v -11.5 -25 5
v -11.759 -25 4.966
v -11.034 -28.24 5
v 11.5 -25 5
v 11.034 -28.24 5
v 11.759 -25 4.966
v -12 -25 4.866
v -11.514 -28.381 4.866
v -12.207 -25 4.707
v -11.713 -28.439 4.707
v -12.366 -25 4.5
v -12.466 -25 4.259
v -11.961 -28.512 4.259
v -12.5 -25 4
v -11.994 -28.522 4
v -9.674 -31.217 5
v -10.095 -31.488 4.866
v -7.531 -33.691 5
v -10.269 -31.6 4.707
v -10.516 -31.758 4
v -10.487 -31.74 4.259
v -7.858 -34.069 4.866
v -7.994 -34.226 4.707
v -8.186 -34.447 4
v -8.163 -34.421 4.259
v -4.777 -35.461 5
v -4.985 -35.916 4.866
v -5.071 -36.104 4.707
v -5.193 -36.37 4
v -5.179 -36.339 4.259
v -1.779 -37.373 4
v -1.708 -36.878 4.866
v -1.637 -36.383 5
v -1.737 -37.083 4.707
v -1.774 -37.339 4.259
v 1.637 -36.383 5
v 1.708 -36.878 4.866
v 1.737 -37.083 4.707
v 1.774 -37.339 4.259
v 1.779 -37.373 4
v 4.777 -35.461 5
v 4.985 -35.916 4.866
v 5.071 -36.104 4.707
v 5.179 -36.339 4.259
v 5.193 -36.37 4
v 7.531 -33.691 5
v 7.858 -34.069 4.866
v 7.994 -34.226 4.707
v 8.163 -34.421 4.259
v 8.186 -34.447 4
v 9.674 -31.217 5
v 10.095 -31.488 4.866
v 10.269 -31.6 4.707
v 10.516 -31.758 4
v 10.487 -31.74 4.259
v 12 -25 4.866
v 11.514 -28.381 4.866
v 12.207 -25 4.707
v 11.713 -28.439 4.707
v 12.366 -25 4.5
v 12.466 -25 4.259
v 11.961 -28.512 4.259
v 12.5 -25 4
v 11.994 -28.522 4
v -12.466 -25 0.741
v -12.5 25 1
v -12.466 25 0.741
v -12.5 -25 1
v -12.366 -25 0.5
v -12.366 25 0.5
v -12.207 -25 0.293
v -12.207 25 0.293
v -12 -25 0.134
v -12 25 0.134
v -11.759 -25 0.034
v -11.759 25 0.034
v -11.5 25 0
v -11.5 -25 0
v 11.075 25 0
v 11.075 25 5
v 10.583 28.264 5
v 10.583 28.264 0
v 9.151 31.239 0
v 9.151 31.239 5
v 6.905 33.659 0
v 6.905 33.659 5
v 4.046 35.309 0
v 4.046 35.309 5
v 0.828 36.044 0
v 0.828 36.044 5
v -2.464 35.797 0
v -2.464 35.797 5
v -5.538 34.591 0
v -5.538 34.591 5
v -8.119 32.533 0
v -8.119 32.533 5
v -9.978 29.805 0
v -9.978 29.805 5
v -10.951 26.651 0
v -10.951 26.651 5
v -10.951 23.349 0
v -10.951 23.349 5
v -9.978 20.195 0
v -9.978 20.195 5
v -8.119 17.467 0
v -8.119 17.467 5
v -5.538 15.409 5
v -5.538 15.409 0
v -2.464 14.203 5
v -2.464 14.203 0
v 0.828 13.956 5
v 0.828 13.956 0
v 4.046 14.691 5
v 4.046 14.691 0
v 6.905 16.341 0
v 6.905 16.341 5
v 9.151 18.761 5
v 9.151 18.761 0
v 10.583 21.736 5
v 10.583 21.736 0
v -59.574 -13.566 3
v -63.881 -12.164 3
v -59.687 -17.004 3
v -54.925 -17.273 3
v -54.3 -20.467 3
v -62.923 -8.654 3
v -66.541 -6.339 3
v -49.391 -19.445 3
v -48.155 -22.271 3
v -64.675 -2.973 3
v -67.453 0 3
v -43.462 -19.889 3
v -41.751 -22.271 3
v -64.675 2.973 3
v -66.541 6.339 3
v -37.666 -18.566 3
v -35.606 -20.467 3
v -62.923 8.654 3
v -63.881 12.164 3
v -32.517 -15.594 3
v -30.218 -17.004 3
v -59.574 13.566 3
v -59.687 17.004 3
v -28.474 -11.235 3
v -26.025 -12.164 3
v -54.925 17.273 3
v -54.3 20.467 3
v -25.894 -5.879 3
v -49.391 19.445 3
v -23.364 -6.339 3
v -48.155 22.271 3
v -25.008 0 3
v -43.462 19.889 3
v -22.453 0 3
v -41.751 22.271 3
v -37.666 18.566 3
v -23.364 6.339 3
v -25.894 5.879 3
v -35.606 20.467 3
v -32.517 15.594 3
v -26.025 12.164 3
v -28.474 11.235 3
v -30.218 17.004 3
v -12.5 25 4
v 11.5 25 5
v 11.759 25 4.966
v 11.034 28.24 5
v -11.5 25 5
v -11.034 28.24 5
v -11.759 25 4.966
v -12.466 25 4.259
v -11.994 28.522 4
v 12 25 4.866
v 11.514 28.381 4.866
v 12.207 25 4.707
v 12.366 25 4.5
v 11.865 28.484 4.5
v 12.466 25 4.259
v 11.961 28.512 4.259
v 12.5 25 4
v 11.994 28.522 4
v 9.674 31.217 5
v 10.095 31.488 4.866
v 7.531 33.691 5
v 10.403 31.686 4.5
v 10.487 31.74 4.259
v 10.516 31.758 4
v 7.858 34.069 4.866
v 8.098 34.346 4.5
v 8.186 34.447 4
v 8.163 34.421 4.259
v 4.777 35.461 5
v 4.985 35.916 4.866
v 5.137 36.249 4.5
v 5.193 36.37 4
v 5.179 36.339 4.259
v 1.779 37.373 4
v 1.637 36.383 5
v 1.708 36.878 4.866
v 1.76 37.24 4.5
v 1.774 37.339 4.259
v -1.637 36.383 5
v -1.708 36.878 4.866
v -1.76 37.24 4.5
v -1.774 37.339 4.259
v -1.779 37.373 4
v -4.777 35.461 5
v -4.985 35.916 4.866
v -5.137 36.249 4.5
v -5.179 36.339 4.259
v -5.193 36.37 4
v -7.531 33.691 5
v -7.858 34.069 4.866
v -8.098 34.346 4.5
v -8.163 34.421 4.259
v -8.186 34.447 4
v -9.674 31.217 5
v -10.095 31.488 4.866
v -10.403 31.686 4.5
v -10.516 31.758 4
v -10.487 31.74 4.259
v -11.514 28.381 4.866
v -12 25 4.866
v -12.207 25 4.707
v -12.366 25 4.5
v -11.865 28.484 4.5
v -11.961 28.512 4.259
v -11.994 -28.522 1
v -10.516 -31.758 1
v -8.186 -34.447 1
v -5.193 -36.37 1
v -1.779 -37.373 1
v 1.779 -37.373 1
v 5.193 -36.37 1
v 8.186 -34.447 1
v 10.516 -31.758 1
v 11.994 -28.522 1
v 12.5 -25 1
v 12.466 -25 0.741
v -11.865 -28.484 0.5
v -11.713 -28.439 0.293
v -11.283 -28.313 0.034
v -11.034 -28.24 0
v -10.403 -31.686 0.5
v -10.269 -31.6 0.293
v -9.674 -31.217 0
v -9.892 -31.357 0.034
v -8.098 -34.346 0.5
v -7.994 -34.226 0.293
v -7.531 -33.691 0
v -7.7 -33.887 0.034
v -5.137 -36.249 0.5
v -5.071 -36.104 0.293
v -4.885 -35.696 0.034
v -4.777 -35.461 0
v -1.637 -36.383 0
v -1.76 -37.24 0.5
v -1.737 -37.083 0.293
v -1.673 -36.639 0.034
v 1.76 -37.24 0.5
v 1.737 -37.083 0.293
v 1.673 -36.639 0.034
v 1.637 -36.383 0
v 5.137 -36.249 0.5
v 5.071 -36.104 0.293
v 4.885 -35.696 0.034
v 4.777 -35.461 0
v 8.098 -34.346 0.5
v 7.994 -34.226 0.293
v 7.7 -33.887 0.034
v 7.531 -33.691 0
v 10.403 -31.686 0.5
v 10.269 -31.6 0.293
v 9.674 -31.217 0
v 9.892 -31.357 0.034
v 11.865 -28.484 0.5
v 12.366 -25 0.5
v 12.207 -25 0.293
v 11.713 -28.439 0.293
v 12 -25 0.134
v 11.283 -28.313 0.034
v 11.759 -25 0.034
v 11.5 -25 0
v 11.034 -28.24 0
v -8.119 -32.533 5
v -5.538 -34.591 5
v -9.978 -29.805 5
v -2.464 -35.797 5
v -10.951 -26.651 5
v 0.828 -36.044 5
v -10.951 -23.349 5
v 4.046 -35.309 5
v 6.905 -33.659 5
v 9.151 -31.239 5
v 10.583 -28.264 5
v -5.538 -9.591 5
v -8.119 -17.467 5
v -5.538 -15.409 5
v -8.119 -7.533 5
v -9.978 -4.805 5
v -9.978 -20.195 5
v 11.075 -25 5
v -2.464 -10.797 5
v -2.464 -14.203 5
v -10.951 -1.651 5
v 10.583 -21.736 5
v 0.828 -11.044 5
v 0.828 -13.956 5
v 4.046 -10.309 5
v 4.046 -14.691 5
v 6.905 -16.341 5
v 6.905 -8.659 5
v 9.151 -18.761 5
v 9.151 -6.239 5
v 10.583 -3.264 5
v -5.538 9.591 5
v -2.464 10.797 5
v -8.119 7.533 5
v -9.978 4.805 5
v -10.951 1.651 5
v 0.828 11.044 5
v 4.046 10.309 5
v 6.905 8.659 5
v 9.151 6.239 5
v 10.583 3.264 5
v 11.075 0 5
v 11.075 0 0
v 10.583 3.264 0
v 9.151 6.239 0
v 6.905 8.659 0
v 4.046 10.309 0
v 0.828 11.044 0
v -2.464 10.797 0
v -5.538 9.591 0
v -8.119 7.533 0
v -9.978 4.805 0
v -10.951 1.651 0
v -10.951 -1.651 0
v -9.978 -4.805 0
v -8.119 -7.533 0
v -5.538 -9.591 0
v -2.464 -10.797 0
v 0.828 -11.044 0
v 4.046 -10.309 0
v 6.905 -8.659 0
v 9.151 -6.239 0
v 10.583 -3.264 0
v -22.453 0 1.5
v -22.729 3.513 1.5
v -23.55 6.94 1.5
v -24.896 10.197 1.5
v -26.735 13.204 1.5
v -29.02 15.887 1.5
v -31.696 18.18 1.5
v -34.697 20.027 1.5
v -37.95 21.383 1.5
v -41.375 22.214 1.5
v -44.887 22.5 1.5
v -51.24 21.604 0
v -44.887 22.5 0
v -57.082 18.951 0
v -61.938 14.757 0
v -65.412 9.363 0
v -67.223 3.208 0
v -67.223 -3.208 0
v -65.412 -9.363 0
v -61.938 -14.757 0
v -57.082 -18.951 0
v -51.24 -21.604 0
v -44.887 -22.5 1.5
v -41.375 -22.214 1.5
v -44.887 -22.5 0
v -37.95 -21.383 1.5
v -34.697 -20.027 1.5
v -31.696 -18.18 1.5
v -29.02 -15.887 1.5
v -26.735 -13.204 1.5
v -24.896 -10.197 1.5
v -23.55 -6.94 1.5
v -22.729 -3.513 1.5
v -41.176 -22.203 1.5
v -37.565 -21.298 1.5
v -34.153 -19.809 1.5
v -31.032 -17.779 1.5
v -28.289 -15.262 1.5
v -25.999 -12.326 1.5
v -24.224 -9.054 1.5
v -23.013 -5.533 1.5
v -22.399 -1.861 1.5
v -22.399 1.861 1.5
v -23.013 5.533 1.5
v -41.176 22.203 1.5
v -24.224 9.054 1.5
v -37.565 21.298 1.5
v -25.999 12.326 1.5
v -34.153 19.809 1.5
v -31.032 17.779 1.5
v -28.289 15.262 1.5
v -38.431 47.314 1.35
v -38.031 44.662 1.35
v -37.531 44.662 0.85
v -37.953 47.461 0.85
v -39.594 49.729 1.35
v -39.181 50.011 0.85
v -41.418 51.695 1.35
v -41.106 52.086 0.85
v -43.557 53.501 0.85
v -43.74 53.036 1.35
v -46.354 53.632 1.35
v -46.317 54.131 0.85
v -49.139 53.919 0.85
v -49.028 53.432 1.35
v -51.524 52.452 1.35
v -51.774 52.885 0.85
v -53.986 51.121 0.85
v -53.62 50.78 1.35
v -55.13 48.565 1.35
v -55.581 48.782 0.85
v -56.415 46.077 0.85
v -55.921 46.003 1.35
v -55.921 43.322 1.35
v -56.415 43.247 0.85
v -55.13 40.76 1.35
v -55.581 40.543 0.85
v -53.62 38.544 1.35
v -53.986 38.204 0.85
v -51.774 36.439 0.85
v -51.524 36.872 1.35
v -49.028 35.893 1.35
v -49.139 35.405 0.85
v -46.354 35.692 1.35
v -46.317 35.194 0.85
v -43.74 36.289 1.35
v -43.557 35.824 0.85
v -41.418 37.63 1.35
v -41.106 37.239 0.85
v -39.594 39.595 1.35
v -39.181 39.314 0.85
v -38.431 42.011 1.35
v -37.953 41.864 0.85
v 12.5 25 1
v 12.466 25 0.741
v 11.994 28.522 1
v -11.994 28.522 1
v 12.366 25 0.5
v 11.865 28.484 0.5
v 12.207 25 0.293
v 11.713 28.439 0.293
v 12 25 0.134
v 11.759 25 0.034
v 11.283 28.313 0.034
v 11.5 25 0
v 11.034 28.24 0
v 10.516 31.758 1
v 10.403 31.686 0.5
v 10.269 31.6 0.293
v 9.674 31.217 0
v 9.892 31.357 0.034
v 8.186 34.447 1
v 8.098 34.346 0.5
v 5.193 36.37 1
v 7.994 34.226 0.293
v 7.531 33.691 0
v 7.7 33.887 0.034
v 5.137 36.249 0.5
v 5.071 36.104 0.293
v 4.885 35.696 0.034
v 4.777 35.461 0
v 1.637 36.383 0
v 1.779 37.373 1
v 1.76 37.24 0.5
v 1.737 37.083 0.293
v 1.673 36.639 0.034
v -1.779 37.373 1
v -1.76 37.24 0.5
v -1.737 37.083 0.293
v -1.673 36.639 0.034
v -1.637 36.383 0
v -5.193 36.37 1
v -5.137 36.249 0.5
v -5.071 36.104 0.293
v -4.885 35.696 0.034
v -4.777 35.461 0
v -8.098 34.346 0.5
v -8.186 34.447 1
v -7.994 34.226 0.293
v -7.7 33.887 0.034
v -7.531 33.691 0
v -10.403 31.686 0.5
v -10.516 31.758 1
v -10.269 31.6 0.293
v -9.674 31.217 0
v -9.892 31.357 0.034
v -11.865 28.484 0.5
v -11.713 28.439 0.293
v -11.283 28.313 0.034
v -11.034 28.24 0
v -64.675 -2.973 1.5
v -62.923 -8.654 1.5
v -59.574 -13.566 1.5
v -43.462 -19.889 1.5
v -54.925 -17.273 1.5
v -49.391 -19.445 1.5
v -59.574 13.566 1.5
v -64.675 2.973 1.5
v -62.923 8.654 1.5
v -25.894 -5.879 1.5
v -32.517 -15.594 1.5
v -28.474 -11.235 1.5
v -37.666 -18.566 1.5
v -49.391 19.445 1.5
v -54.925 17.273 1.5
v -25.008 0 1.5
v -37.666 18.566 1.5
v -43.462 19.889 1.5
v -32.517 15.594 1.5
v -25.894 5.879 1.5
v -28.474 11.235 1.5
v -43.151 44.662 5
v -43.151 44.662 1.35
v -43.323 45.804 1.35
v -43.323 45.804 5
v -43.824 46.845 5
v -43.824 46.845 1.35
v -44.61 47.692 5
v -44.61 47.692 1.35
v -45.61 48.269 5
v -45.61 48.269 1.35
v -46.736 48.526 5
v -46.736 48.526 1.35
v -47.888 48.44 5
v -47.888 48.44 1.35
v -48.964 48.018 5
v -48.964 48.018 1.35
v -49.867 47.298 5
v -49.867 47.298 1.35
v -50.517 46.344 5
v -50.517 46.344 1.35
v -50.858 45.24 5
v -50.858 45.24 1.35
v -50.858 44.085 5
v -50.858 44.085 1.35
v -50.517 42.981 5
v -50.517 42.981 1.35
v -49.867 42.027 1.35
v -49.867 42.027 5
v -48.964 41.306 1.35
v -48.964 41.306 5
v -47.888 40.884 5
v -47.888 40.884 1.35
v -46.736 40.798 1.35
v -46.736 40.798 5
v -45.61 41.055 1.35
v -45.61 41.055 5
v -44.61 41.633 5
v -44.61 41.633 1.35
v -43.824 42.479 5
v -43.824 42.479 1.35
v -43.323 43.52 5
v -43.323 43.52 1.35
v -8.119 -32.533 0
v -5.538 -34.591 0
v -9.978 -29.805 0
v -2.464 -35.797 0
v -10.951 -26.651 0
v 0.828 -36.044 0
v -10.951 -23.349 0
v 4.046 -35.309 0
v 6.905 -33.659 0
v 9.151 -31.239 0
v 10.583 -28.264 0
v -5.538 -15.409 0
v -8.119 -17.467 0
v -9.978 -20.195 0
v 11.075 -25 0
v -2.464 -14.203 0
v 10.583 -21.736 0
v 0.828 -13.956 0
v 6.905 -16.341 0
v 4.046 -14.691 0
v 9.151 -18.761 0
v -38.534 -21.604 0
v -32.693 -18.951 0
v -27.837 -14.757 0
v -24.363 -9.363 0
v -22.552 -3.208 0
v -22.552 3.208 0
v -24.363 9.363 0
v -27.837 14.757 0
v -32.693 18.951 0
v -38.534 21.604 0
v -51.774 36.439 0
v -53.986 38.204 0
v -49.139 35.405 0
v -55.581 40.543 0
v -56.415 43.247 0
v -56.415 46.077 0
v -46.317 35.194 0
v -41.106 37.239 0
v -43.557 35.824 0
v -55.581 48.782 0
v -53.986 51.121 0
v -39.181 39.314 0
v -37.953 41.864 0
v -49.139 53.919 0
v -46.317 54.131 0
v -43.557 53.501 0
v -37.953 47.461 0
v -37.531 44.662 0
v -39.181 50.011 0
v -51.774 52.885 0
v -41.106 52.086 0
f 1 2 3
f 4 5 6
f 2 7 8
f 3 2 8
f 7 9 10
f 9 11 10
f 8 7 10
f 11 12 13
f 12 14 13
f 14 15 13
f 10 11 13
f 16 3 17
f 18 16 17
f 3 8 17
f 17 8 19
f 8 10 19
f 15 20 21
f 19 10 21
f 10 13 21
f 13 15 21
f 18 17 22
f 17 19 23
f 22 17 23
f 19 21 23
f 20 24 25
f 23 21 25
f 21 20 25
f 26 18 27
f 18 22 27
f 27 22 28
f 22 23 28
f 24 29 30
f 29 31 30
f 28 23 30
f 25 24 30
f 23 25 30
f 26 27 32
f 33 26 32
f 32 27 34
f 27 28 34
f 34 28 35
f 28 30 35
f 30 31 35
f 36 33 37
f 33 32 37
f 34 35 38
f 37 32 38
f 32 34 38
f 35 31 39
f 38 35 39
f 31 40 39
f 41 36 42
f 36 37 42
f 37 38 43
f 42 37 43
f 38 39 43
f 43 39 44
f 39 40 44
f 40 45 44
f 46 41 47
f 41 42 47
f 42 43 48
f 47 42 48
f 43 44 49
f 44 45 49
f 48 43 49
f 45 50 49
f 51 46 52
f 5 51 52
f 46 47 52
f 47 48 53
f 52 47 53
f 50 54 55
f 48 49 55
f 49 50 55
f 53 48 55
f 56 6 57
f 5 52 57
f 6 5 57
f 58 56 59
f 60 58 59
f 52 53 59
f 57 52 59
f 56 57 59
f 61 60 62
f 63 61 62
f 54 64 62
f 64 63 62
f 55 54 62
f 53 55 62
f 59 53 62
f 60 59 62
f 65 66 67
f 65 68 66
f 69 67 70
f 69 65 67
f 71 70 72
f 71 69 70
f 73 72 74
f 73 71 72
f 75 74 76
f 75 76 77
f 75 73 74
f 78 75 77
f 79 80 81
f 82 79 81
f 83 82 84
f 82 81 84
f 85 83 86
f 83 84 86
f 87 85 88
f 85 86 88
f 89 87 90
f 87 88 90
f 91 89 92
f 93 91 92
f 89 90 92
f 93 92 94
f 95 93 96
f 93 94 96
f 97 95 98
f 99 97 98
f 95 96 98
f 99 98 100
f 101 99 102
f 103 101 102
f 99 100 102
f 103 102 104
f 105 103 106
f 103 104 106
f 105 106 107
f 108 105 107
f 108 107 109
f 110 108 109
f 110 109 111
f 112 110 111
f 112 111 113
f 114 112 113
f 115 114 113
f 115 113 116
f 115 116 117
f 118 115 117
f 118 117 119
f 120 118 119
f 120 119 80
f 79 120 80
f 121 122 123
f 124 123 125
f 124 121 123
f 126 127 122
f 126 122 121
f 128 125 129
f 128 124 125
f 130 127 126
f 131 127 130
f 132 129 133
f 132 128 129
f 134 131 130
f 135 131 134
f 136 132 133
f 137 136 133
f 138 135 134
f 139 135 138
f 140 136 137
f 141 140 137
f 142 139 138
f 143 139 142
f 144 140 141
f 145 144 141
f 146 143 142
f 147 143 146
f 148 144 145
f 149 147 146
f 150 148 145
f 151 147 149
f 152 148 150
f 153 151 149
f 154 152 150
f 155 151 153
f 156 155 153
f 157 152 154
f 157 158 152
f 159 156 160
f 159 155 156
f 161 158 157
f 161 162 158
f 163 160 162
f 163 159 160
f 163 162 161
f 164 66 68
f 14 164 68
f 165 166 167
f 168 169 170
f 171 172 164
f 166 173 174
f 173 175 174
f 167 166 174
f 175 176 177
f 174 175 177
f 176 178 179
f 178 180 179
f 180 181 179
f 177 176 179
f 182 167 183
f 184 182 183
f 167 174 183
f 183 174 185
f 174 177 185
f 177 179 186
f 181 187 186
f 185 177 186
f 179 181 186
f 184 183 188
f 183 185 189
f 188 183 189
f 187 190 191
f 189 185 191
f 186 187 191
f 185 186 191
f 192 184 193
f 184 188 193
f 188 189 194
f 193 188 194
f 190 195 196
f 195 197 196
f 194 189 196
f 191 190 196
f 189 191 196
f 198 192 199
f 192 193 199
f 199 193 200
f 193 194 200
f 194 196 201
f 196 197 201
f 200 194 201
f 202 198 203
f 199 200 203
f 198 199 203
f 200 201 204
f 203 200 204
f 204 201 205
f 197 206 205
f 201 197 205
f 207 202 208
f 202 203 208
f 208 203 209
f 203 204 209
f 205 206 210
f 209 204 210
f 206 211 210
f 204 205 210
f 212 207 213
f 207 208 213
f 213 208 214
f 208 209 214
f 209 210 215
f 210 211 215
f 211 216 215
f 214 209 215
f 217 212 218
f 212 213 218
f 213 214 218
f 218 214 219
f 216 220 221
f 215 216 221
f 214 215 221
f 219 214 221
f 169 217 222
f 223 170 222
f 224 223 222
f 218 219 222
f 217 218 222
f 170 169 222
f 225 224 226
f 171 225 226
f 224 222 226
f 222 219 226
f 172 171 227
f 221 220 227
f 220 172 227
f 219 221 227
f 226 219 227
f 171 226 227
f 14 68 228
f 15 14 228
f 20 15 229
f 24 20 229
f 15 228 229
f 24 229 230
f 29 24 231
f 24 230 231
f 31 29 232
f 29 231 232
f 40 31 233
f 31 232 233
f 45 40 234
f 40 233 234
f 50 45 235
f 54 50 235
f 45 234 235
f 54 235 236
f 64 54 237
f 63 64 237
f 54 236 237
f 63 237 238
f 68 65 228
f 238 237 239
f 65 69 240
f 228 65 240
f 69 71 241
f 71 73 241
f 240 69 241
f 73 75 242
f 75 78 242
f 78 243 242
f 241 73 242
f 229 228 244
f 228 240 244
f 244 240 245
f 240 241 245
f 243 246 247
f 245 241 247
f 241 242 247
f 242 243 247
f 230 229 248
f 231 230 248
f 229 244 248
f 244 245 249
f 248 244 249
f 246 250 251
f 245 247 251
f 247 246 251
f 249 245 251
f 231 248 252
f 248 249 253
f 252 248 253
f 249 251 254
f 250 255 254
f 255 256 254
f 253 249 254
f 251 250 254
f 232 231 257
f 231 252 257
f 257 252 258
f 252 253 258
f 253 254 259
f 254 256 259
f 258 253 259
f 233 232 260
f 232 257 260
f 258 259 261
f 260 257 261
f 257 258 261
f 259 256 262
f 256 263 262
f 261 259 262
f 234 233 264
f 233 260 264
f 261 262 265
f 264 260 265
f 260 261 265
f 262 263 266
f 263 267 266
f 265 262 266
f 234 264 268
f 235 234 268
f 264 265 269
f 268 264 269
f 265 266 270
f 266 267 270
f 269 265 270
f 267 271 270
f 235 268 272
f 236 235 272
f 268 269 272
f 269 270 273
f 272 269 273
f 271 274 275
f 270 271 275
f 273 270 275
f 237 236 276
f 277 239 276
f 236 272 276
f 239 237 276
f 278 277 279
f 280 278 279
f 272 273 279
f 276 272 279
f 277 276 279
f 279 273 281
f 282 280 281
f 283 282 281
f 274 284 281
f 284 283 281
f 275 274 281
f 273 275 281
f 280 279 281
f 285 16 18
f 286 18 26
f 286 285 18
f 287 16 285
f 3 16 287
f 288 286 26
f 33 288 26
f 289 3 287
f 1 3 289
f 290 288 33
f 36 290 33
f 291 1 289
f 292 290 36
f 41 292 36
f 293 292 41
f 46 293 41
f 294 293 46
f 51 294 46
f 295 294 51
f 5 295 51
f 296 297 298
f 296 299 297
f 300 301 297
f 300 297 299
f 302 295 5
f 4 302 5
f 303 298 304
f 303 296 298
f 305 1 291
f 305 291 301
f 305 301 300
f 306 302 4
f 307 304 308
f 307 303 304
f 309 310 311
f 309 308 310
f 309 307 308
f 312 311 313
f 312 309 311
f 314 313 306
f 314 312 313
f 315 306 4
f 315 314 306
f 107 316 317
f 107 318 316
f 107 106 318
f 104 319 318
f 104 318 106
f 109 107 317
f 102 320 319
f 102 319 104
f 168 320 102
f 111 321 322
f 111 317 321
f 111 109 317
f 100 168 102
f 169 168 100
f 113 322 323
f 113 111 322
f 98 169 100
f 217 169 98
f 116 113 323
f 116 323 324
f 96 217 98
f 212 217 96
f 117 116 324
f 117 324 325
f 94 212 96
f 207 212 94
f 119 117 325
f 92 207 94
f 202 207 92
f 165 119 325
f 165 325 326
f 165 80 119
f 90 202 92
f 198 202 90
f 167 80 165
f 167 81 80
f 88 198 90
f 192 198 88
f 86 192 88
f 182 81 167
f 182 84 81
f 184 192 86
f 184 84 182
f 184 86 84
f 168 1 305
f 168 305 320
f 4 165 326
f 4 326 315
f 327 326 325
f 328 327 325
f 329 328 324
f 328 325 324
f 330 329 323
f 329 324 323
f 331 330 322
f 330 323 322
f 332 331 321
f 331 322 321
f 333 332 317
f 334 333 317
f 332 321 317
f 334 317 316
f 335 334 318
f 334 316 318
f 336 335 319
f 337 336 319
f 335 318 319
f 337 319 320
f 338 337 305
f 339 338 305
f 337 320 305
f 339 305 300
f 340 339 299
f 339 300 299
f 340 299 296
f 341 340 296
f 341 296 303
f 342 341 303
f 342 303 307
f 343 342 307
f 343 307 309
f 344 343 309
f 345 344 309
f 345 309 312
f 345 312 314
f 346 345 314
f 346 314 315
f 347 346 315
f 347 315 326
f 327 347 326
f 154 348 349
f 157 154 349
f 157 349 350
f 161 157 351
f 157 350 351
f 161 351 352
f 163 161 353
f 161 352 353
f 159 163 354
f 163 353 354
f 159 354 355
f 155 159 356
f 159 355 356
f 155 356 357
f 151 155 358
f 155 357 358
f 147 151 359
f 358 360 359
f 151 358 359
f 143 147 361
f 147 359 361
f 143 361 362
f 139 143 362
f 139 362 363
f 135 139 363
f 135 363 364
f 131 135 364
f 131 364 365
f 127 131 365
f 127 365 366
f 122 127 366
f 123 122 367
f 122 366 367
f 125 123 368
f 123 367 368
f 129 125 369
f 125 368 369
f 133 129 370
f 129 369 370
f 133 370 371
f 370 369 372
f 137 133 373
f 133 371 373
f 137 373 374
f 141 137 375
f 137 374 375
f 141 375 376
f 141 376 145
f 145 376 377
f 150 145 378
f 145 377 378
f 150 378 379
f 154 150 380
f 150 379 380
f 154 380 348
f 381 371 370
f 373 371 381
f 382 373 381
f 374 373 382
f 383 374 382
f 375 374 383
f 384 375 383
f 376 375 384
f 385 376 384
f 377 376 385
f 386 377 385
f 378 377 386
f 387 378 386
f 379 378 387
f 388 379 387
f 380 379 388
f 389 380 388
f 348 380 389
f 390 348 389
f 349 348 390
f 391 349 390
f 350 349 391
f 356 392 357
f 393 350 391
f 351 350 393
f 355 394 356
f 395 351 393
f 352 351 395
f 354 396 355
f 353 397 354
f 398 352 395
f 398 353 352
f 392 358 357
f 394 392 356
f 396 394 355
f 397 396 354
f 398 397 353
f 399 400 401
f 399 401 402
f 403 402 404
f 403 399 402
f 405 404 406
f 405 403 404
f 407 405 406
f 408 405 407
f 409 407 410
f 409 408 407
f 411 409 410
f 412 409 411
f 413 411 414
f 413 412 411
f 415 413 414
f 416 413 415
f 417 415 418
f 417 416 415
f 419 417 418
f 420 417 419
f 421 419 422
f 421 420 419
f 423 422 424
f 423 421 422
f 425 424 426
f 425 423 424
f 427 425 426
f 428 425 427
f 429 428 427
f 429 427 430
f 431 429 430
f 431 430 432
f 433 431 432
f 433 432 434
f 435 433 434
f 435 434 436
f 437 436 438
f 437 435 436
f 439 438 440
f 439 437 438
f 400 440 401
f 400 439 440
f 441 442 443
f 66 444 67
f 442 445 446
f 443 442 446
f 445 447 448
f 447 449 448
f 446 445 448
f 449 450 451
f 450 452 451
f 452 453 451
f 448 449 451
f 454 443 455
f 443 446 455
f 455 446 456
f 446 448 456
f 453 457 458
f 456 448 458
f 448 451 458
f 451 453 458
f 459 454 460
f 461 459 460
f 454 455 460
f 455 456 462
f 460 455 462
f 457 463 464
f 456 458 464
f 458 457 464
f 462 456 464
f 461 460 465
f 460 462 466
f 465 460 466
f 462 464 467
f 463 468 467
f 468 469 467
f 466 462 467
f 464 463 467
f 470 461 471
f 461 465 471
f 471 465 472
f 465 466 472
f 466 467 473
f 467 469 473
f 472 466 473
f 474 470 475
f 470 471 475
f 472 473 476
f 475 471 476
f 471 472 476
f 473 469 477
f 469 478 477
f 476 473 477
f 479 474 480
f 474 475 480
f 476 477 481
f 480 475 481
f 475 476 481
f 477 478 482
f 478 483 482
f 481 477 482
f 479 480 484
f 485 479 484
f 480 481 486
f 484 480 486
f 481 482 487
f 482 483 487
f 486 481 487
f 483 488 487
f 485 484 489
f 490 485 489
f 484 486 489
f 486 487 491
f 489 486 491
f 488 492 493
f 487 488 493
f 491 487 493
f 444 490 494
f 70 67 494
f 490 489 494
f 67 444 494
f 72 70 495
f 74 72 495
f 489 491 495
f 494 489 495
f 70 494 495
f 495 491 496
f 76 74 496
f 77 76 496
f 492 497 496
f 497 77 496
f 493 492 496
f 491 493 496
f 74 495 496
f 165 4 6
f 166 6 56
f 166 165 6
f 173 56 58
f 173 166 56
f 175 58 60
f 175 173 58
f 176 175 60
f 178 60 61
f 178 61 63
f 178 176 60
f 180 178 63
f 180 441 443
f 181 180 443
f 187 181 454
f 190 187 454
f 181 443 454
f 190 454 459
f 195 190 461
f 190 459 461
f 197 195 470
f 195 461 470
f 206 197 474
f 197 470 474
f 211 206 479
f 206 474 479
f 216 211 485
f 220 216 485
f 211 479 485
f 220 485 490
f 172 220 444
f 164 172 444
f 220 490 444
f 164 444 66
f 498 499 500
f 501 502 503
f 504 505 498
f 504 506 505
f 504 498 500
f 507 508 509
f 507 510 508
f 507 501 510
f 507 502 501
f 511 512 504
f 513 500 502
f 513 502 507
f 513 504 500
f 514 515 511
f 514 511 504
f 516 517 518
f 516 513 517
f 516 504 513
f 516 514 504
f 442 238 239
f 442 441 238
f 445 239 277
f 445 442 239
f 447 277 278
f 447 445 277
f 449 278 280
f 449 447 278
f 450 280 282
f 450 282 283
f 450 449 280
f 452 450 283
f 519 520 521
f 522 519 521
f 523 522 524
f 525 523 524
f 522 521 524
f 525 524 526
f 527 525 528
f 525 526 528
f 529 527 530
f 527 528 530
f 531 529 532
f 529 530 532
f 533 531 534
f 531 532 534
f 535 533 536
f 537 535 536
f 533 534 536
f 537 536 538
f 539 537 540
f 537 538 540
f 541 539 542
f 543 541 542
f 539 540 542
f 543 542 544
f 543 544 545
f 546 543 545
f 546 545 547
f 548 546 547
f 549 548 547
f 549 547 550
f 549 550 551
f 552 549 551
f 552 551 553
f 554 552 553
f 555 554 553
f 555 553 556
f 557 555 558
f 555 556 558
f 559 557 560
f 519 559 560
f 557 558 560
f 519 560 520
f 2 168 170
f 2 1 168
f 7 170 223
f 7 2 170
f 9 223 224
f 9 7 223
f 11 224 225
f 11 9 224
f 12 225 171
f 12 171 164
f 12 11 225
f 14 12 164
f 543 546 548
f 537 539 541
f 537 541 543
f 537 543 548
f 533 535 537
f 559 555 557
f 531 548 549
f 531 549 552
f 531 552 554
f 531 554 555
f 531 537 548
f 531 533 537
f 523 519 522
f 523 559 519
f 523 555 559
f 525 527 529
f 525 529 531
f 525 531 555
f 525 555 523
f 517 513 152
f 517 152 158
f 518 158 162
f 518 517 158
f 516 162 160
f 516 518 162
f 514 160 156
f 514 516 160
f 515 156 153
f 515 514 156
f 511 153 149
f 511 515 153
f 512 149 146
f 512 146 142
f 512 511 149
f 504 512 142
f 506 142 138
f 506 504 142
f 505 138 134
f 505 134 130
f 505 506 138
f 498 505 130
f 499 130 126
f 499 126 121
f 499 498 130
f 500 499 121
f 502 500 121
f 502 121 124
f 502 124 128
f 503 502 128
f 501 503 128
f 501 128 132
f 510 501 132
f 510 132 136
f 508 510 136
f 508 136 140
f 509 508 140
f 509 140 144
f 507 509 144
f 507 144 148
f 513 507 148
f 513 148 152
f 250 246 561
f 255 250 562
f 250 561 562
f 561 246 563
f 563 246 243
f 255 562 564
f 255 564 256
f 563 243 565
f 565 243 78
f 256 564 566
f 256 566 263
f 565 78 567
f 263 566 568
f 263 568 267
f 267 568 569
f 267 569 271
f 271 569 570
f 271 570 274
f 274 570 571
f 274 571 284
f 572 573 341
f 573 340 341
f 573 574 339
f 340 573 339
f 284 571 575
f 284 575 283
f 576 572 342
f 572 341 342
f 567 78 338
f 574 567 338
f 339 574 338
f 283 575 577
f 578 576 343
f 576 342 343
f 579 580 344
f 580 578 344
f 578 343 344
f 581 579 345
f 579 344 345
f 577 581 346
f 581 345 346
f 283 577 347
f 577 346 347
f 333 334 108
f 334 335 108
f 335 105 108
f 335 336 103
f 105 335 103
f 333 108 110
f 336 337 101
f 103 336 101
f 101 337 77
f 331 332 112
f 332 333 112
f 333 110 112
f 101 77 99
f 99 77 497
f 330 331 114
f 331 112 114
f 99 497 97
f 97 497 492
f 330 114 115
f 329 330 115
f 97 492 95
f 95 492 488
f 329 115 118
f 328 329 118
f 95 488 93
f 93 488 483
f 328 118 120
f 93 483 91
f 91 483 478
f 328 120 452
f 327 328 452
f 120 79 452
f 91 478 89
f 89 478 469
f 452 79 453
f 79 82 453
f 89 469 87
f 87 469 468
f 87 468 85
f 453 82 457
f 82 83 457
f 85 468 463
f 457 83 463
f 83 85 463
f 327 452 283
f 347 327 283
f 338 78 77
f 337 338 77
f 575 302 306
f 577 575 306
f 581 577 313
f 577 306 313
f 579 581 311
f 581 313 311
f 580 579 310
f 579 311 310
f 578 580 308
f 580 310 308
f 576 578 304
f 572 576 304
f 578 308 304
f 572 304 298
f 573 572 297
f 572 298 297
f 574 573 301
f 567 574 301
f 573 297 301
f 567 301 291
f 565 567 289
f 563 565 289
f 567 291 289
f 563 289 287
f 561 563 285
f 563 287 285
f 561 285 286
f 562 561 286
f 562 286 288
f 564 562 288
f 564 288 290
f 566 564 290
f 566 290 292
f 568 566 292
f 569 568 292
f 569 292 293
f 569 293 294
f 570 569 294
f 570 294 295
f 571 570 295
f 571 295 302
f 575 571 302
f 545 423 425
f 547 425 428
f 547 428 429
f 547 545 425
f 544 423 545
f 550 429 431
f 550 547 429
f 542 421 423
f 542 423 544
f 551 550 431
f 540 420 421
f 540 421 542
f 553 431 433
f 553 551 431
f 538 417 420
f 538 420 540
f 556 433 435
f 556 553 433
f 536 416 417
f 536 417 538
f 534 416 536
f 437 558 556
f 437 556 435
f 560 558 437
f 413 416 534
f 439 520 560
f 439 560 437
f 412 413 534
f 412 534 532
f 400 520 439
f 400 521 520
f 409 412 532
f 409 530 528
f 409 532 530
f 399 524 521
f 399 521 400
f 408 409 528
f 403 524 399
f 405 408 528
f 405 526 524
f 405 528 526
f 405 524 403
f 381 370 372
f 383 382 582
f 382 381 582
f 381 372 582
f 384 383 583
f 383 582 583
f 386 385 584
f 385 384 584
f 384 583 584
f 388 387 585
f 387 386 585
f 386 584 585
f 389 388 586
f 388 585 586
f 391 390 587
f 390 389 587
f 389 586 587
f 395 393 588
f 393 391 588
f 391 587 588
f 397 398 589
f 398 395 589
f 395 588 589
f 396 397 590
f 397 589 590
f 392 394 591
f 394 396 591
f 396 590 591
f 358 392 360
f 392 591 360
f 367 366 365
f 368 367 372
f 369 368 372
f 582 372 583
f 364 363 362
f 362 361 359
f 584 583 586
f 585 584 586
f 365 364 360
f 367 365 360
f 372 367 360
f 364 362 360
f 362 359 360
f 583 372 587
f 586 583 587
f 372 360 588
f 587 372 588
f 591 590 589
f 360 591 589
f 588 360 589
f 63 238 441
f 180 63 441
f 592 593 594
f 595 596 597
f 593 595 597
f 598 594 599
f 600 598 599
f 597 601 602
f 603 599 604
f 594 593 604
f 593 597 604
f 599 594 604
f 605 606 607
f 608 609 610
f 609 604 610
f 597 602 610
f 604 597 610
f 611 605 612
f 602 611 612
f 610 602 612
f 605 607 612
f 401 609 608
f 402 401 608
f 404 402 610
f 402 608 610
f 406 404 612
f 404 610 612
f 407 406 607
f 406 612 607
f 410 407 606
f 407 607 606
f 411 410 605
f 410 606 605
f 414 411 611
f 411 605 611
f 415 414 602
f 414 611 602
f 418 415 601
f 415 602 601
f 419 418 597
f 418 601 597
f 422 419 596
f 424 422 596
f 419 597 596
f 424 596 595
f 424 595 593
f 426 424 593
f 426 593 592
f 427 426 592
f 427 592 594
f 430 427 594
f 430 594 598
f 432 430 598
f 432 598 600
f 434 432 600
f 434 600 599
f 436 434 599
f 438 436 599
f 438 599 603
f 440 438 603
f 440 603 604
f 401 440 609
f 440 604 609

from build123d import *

# Parameters (mm, degrees)
F1_DEPTH  = 5
F2_R      = 11.075
F3_DEPTH  = 25
F4_R      = 22.5
F4_R_2    = 19.945
F5_DEPTH  = 3
F6_R      = 22.5
F7_DEPTH  = 1.5
F8_R      = 9.495
F9_DEPTH  = 1.35
F10_SIZE  = 0.5
F11_R     = 3.875
F12_DEPTH = 3.65
F13_R     = 1


# Not quite as in the source:
# - a feature names something its author has since deleted; it is built from what else it names


with BuildPart() as f1:
    # F0 (on Top) → F1 (new body)
    with BuildSketch(Plane.XY):
        with BuildLine():
            ThreePointArc((0, -12.5), (8.8388347648, -8.8388347648), (12.5, 0))
            ThreePointArc((12.5, 0), (8.8388347677, 8.838834762), (8.1e-09, 12.5))
            ThreePointArc((8.1e-09, 12.5), (-8.838834762, 8.8388347677), (-12.5, 0))
            ThreePointArc((-12.5, 0), (-8.8388347648, -8.8388347648), (0, -12.5))
        make_face()
        with BuildLine():
            Line((12.5, -25), (12.5, 0))
            ThreePointArc((12.5, 0), (8.8388347648, -8.8388347648), (0, -12.5))
            ThreePointArc((0, -12.5), (8.8388347648, -16.1611652352), (12.5, -25))
        make_face()
        with BuildLine():
            ThreePointArc((8.1e-09, 12.5), (8.8388347677, 8.838834762), (12.5, 0))
            Line((12.5, 0), (12.5, 25))
            ThreePointArc((12.5, 25), (8.8388347677, 16.161165238), (8.1e-09, 12.5))
        make_face()
        with BuildLine():
            ThreePointArc((-12.5, 0), (-8.838834762, 8.8388347677), (8.1e-09, 12.5))
            ThreePointArc((8.1e-09, 12.5), (-8.838834762, 16.1611652323), (-12.5, 25))
            Line((-12.5, 25), (-12.5, 0))
        make_face()
        with BuildLine():
            ThreePointArc((-12.5, 25), (-8.838834762, 16.1611652323), (8.1e-09, 12.5))
            ThreePointArc((8.1e-09, 12.5), (8.8388347677, 16.161165238), (12.5, 25))
            ThreePointArc((12.5, 25), (0, 37.5), (-12.5, 25))
        make_face()
        with BuildLine():
            ThreePointArc((-12.5, -25), (-8.8388347648, -16.1611652352), (0, -12.5))
            ThreePointArc((0, -12.5), (-8.8388347648, -8.8388347648), (-12.5, 0))
            Line((-12.5, 0), (-12.5, -25))
        make_face()
        with BuildLine():
            ThreePointArc((12.5, -25), (8.8388347648, -16.1611652352), (0, -12.5))
            ThreePointArc((0, -12.5), (-8.8388347648, -16.1611652352), (-12.5, -25))
            ThreePointArc((-12.5, -25), (0, -37.5), (12.5, -25))
        make_face()
    extrude(amount=F1_DEPTH)

    # F2 (on face) → F3 (cut)
    with BuildSketch(Plane.XY.offset(5)):
        with Locations((0, 25)):
            Circle(F2_R)
        Circle(F2_R)
        with Locations((0, -25)):
            Circle(F2_R)
    extrude(amount=-F3_DEPTH, mode=Mode.SUBTRACT)

    # F13
    f13_edges = [f1.edges().sort_by_distance(p)[0] for p in [
        (-12.5, 0, 5),
        (0, 37.5, 5),
        (0, -37.5, 5),
        (0, -37.5, 0),
        (12.5, 0, 0),
        (0, 37.5, 0),
        (-12.5, 0, 0),
    ]]
    fillet(f13_edges, radius=F13_R)


with BuildPart() as f5:
    # F4 (on Top) → F5 (new body)
    with BuildSketch(Plane.XY):
        with Locations((-44.9528545141, 0)):
            Circle(F4_R)
        with Locations((-44.9528545141, 0)):
            Circle(F4_R_2, mode=Mode.SUBTRACT)
    extrude(amount=F5_DEPTH)

    # F6 (on face) → F7 (join)
    with BuildSketch(Plane.XY):
        with Locations((-44.8220527387, 0)):
            Circle(F6_R)
    extrude(amount=F7_DEPTH)


with BuildPart() as f9:
    # F8 (on Top) → F9 (new body)
    with BuildSketch(Plane.XY):
        with Locations((-47.0260679722, 44.662322849)):
            Circle(F8_R)
    extrude(amount=F9_DEPTH)

    # F10
    f10_edges = [f9.edges().sort_by_distance(p)[0] for p in [
        (-56.521068, 44.662323, 1.35),
    ]]
    chamfer(f10_edges, length=F10_SIZE)

    # F11 (on face) → F12 (join)
    with BuildSketch(Plane.XY.offset(1.35)):
        with Locations((-47.0260679722, 44.662322849)):
            Circle(F11_R)
    extrude(amount=F12_DEPTH)


solid = Compound([f1.part, f5.part, f9.part])
